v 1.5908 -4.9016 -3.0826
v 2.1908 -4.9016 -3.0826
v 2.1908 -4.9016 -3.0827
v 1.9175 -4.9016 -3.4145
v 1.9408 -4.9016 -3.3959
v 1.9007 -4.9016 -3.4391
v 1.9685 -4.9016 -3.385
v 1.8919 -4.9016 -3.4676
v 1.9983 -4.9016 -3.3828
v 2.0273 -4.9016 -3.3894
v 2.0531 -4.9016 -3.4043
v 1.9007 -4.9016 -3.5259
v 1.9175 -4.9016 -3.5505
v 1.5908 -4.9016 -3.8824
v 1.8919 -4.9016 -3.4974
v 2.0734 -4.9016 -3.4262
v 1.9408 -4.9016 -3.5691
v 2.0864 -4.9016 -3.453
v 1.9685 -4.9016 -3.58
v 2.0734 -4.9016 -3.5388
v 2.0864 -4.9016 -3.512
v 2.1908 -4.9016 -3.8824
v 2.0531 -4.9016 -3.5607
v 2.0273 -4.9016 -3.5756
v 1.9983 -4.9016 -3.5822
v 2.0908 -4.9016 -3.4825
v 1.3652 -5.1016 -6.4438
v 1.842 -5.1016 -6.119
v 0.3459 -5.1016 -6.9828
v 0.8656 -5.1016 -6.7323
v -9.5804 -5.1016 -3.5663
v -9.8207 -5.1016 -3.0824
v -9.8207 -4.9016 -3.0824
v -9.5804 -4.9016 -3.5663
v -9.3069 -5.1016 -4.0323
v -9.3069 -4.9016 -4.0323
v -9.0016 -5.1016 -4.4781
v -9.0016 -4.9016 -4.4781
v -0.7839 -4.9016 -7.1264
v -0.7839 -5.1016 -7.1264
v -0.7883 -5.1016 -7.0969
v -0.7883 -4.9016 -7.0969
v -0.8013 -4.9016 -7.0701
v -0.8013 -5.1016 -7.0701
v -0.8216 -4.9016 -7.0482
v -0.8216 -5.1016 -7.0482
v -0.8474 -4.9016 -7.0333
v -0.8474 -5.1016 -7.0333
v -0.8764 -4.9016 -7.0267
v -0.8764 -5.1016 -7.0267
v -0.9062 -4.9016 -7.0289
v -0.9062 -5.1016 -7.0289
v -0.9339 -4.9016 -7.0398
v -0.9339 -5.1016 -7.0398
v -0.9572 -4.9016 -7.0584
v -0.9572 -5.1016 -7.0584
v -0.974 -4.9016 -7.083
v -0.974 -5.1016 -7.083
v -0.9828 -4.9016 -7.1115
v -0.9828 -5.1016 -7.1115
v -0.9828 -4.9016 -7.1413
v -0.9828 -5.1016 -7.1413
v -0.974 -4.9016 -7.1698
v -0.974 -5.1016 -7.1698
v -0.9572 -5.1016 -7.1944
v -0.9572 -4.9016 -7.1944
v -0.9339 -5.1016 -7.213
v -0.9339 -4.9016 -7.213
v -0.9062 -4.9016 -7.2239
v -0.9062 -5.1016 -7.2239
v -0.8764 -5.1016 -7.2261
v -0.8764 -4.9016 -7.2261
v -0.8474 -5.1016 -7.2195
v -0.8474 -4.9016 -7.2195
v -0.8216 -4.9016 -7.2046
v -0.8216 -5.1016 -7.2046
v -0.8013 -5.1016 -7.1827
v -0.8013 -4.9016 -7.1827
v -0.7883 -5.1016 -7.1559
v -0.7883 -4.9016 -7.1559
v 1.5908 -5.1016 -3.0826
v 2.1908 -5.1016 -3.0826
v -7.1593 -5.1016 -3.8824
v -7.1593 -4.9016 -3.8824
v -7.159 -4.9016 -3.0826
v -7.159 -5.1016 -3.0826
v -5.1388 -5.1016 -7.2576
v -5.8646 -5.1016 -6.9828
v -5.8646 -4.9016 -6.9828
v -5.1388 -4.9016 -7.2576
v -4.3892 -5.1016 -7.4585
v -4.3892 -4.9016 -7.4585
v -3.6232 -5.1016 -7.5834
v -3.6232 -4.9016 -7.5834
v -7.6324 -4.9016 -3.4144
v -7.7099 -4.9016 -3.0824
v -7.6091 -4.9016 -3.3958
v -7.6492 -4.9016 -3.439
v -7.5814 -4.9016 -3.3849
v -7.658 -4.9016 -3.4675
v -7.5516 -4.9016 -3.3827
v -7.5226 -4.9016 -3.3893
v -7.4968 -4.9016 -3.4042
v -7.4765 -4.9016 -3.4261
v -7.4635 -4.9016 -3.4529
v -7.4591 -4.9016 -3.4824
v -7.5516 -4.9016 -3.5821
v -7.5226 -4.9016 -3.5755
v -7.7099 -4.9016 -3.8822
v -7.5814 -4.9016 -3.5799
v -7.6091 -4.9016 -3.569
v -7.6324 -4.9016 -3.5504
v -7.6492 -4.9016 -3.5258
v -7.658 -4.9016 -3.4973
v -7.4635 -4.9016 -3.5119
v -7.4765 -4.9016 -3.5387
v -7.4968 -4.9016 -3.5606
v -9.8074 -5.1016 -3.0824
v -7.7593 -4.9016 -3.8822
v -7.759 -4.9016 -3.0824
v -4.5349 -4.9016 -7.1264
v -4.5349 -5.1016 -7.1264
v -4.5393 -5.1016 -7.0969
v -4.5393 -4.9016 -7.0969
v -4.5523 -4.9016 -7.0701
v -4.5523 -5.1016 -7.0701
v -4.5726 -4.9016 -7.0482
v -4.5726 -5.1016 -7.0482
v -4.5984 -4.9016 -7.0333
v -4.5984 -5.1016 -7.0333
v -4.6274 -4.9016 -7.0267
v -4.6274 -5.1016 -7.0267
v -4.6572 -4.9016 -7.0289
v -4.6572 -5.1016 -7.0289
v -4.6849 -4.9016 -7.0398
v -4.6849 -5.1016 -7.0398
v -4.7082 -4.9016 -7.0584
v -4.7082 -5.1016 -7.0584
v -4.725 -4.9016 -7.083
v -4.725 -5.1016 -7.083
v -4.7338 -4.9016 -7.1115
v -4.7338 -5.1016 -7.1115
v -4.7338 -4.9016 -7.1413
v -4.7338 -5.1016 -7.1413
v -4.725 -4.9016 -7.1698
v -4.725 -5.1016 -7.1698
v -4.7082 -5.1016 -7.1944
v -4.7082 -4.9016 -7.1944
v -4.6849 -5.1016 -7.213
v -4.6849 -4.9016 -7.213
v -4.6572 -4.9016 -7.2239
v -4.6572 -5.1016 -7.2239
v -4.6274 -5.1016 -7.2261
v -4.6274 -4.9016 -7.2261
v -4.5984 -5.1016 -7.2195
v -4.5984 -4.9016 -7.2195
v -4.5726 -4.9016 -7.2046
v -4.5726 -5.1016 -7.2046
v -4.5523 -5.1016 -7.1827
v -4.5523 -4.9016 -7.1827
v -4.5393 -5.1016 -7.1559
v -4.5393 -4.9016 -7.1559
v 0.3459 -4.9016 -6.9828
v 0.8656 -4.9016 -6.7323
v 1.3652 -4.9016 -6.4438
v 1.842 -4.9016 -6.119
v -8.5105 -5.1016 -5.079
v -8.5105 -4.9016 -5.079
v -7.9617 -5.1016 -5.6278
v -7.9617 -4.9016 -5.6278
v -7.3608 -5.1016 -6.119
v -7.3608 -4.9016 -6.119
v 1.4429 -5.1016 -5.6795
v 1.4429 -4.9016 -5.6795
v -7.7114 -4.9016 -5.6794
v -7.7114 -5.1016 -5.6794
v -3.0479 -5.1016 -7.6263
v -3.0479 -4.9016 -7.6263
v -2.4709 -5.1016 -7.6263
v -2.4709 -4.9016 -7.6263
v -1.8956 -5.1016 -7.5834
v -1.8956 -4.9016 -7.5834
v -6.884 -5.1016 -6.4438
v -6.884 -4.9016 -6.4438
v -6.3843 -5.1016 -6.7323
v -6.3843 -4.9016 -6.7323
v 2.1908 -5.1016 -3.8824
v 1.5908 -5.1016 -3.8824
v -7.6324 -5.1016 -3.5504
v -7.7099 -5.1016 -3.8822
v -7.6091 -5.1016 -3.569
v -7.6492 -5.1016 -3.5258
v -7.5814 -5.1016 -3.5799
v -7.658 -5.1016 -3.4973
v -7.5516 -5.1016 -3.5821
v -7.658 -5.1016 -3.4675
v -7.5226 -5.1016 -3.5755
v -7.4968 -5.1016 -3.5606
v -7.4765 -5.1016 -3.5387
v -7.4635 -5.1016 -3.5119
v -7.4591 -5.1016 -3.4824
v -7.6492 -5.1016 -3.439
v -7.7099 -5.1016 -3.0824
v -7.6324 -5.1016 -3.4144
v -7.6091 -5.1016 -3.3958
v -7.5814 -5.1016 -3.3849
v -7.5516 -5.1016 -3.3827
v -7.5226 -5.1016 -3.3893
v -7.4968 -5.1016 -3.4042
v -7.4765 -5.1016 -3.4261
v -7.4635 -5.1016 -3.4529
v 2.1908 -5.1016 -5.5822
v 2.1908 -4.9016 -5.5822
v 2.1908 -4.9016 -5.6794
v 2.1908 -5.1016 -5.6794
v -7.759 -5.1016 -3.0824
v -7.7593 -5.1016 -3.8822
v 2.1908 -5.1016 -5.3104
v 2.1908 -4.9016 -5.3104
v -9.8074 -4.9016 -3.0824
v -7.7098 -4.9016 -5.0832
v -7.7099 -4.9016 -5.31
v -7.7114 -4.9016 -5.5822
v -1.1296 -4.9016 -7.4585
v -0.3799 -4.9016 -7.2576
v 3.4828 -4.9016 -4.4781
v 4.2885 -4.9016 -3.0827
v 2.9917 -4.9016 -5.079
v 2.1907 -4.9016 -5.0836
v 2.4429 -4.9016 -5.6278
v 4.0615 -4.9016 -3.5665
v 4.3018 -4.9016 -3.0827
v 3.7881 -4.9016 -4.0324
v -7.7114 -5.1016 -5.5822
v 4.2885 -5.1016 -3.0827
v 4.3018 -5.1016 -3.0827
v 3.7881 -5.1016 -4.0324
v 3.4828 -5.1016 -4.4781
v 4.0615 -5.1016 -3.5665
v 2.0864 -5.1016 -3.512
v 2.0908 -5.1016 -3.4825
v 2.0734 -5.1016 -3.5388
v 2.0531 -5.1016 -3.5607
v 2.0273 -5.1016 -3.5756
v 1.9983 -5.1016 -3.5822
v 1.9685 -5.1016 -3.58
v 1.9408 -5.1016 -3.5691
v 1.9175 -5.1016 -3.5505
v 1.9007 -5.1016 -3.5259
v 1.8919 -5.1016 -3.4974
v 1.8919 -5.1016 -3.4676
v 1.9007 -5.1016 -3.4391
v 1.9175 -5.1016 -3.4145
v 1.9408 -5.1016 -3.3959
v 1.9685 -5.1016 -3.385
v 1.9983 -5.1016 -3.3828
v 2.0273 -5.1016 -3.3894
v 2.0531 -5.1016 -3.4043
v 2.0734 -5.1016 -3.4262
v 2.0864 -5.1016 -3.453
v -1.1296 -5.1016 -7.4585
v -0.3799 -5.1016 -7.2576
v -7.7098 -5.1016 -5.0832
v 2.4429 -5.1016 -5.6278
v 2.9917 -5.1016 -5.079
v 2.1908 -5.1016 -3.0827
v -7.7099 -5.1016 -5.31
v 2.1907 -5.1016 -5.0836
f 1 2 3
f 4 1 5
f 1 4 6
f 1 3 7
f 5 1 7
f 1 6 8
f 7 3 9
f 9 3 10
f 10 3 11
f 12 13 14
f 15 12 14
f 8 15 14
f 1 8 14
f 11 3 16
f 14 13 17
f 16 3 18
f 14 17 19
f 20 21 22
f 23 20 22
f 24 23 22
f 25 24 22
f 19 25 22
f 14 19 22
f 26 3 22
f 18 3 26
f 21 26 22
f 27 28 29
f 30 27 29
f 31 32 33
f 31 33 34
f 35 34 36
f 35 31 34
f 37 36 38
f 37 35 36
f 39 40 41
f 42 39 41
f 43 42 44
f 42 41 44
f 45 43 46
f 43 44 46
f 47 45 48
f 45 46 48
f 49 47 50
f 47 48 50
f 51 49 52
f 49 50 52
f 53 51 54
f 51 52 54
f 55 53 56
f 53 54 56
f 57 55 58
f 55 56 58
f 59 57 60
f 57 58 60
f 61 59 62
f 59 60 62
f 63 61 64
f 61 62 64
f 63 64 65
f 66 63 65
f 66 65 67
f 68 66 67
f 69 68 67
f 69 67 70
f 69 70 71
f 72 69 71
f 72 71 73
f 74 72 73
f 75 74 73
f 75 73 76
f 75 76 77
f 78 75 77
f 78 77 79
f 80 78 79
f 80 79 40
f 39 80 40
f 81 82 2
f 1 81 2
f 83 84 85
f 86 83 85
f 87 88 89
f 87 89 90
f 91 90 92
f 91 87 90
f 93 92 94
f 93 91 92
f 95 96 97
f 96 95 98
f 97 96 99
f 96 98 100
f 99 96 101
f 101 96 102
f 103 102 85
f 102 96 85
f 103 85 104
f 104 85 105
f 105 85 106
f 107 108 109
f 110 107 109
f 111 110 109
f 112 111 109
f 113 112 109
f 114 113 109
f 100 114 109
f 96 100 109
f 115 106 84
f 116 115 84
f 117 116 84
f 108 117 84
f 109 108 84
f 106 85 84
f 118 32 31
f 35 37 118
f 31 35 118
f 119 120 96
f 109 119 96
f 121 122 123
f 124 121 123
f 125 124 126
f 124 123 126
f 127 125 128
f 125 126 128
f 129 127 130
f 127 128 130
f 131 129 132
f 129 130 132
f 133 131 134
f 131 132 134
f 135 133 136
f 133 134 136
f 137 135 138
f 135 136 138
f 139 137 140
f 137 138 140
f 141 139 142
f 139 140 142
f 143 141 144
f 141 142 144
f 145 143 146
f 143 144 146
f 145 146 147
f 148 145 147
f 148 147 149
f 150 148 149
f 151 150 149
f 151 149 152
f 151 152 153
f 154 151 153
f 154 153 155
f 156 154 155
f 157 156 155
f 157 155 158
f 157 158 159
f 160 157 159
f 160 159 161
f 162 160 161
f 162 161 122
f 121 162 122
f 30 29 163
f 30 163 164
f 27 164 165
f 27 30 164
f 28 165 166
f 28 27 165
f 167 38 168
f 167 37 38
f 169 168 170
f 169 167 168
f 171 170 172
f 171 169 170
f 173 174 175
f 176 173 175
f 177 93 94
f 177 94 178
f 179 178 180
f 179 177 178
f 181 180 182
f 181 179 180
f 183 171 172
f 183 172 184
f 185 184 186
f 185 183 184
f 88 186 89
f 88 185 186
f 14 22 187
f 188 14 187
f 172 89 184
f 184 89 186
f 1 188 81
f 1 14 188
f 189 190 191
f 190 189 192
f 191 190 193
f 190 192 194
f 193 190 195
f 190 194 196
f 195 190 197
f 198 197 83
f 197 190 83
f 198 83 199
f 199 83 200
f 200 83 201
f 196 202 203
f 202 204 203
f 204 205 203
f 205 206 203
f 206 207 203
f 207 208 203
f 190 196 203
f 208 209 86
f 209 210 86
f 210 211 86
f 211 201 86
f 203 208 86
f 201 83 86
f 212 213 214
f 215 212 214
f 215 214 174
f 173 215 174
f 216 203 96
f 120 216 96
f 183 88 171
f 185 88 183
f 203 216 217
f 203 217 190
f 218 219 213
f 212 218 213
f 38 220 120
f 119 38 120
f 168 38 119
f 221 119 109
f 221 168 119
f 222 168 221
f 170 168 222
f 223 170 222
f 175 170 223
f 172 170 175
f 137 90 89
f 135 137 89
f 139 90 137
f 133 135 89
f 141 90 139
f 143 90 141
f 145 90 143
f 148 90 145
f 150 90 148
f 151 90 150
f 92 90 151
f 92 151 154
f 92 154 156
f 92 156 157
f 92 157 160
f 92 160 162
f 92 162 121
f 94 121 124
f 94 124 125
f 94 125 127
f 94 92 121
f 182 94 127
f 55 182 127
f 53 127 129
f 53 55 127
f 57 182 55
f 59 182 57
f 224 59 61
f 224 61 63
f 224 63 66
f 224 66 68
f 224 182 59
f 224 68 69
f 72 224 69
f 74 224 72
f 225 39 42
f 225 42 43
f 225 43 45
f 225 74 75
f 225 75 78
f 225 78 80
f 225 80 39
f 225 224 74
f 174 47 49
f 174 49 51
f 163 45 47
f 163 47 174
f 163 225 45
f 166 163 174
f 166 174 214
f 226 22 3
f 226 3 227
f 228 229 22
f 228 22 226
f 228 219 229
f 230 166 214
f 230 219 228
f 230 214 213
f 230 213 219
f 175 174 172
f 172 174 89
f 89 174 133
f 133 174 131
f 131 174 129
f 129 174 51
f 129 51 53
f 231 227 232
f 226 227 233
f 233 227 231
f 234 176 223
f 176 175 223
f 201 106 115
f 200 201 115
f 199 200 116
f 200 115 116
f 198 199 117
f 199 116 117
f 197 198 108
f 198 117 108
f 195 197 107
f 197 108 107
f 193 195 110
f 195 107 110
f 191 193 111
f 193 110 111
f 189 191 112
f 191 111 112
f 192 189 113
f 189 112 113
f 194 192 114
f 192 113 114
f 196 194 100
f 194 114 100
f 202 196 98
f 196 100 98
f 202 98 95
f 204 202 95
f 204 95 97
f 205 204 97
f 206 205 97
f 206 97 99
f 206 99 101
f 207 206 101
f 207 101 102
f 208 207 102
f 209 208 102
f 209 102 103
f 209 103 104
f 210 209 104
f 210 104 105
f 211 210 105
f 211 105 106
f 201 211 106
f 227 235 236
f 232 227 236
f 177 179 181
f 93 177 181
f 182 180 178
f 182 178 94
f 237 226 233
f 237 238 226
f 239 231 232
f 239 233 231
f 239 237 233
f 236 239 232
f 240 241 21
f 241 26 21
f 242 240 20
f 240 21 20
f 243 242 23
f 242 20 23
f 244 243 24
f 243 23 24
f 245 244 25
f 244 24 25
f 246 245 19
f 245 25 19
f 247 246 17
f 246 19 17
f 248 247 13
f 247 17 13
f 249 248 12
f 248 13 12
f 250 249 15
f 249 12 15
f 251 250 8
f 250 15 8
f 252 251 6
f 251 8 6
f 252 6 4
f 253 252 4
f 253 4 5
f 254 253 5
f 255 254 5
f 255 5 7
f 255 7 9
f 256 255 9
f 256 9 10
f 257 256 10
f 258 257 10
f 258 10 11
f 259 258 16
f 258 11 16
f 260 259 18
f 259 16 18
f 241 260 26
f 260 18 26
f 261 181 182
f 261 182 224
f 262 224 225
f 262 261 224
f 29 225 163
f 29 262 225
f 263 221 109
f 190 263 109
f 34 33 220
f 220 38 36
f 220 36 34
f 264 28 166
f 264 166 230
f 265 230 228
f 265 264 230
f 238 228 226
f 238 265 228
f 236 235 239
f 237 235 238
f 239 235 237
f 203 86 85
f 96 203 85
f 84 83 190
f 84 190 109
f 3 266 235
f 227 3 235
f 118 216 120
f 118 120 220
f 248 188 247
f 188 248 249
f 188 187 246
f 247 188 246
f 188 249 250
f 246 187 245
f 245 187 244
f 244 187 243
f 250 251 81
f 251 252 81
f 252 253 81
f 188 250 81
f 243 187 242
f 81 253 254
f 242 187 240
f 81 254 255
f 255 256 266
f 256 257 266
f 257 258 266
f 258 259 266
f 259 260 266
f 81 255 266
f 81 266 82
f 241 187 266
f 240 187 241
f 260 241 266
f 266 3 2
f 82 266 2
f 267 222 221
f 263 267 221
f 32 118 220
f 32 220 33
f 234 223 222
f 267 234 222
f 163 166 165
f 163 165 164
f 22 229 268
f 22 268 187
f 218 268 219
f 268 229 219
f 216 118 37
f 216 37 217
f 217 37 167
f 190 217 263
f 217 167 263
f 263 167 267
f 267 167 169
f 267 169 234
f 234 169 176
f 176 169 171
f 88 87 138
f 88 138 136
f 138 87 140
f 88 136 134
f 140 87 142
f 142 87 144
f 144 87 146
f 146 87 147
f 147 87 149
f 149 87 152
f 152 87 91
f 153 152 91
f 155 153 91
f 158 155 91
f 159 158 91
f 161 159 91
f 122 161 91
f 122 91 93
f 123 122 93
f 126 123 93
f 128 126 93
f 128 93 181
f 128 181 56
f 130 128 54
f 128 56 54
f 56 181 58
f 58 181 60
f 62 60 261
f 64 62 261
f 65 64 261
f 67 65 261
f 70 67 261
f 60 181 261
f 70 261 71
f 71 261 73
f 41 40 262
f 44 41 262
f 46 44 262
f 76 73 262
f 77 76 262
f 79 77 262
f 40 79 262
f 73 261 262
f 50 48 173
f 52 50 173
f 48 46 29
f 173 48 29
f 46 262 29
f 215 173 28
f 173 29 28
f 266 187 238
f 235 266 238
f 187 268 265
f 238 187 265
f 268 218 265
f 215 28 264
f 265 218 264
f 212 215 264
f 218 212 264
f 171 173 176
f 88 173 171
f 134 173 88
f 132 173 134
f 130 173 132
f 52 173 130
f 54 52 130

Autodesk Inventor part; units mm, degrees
ref_plane "Plano de trabajo1" through (-3.6477, -5.1016, -7.3334) normal (0, 1, 0) x (1, 0, 0)
sketch "Boceto1" plane through (-3.6477, -5.1016, -7.3334) normal (0, 1, 0) x (1, 0, 0)
  line L0 (5.2883, -3.4507) -> (5.2882, -3.8566) projected
  line L1 (4.7883, -3.4507) -> (5.2883, -3.4507) projected
  line L2 (5.2882, -3.8566) -> (5.2882, -4.1566) projected
  line L3 (5.2881, -4.2507) -> (4.0881, -4.2506) projected
  line L4 (-3.5114, -3.8566) -> (-3.5113, -4.1566) projected
  line L5 (-3.5114, -3.8566) -> (-3.5116, -3.451) projected
  line L6 (-3.5116, -3.451) -> (-3.0116, -3.4508) projected
  line L7 (-3.7131, -1.2144) -> (-2.2169, -0.3506) projected
  line L8 (-6.2177, -4.3514) -> (-5.3539, -2.8553) projected
  line L9 (7.1305, -2.8553) -> (7.9943, -4.3514) projected
  line L10 (3.9936, -0.3506) -> (5.4897, -1.2144) projected
  line L11 (0.0245, 0.25) -> (1.7521, 0.25) projected
  arc A0 (7.9495, -4.2507) -> (-6.173, -4.251) centre (0.8883, -7.4566) ccw
  line L12 (-2.3112, -4.2505) -> (-3.5112, -4.251) projected
  line L13 (5.2881, -4.2507) -> (7.9495, -4.2507)
  line L14 (-3.5112, -4.251) -> (-6.173, -4.251)
  line L15 (-3.5112, -4.251) -> (-3.5116, -3.451)
  line L16 (-3.5116, -3.451) -> (5.2883, -3.4507)
  line L17 (5.2883, -3.4507) -> (5.2881, -4.2507)
  point P0 (3.6477, -7.3334)
extrude "Extrusión1" add sketch "Boceto1" along normal blind 0.2
ref_plane "Plano de trabajo2" through (-3.6477, -4.9016, -7.3334) normal (0, 1, 0) x (1, 0, 0)
sketch "Boceto2" plane through (-3.6477, -4.9016, -7.3334) normal (0, 1, 0) x (1, 0, 0)
  line L0 (5.0906, -1.7512) -> (-3.3106, -1.7469) projected
  line L1 (-3.3106, -1.8516) -> (-3.9207, -1.8515) projected
  line L2 (5.8384, -2.2498) -> (5.8385, -2.023) projected
  line L3 (-4.0622, -2.0234) -> (-4.0621, -2.2502) projected
  line L4 (5.8385, -2.023) -> (5.8385, -4.7089)
  line L5 (-4.0622, -2.0234) -> (-4.0622, -5.784)
  line L6 (5.0906, -1.7512) -> (-3.3106, -1.7469)
  line L7 (5.8385, -2.023) -> (5.8385, -1.7512)
  line L8 (5.8385, -1.7512) -> (5.0906, -1.7512)
  line L9 (-3.3106, -1.7469) -> (-4.0637, -1.7512)
  line L10 (-4.0637, -1.7512) -> (-4.0622, -2.0234)
  line L11 (5.8385, -4.7089) -> (-4.0637, -4.7089)
  line L12 (-4.0637, -4.7089) -> (-4.0637, -1.7512)
  line L13 (-4.0637, -1.7512) -> (5.8385, -1.7512)
  line L14 (5.8385, -1.7512) -> (5.8385, -4.7089)
  line L15 (5.0906, -1.6539) -> (-3.3105, -1.6519) projected
  line L16 (-4.0637, -1.7512) -> (5.8385, -1.7512)
  line L17 (5.8385, -1.7512) -> (5.8385, -1.654)
  line L18 (5.8385, -1.654) -> (-4.0637, -1.654)
  line L19 (-4.0637, -1.654) -> (-4.0637, -1.7512)
  point P0 (3.6477, -7.3334)
  point P1 (-3.2616, -3.4509)
extrude "Extrusión2" cut sketch "Boceto2" against normal blind 0.2
ref_plane "Plano de trabajo3" through (-7.1593, -4.0366, -3.8824) normal (-1, 0, 0.0004) x (0.0004, 0, 1)
sketch "Boceto3" plane through (-7.1593, -4.0366, -3.8824) normal (-1, 0, 0.0004) x (0.0004, 0, 1)
  line L0 (0.7998, -1.065) -> (0.7998, -0.865) projected
  line L1 (-1.7972, -1.065) -> (0.7998, -1.065) projected
  line L2 (-1.7972, -0.865) -> (-1.7972, -1.065) projected
  line L3 (0.7998, -0.865) -> (-1.7972, -0.865) projected
  line L4 (0, -1.065) -> (0, -0.4397)
  line L5 (0.7998, -0.865) -> (0, -0.865)
  line L6 (0, -0.865) -> (0, -1.065)
  line L7 (0, -1.065) -> (0.7998, -1.065)
  line L8 (0.7998, -1.065) -> (0.7998, -0.865)
  point P0 (3.8854, 4.0366)
extrude "Extrusión3" add sketch "Boceto3" along normal blind 0.6 contours L1 L4 L3 L0
ref_plane "Plano de trabajo4" through (2.1908, -4.9016, -5.3103) normal (-1, 0, 0) x (0, 0, 1)
sketch "Boceto4" plane through (2.1908, -4.9016, -5.3103) normal (-1, 0, 0) x (0, 0, 1)
  line L0 (2.2277, -0.2) -> (2.2277, 0) projected
  line L1 (1.4279, 0) -> (1.4279, -0.2) projected
  line L2 (2.2277, 0) -> (1.4279, 0) projected
  line L3 (1.4279, -0.2) -> (2.2277, -0.2) projected
  point P0 (5.3103, 4.9016)
extrude "Extrusión4" add sketch "Boceto4" along normal blind 0.6
sketch "Boceto5" plane through (-3.6477, -4.9016, -7.3334) normal (0, 1, 0) x (1, 0, 0)
  line L0 (-3.5116, -3.451) -> (-3.5112, -4.2507) projected
  line L1 (-3.5112, -4.2507) -> (-4.3112, -4.251)
  line L2 (-4.1112, -4.251) -> (-6.173, -4.251) projected
  line L3 (-3.5116, -3.451) -> (-3.5112, -4.2507)
  circle A0 centre (-3.9114, -3.851) radius 0.1
  line L4 (5.2385, -3.451) -> (5.2385, -4.2507) projected
  line L5 (5.2385, -3.451) -> (5.2385, -4.2507)
  line L6 (5.2385, -4.2507) -> (6.0385, -4.2507)
  line L7 (5.8385, -4.2507) -> (7.9495, -4.2507) projected
  line L8 (5.8385, -3.451) -> (5.2385, -3.451) projected
  circle A1 centre (5.6385, -3.8509) radius 0.1
  point P0 (3.6477, -7.3334)
  dimension "d9" = 0.8
  dimension "d10" = 0.2
  dimension "d11" = 0.8
  dimension "d12" = 0.2
extrude "Extrusión5" cut sketch "Boceto5" against normal blind 0.6
sketch "Boceto6" plane through (-3.6477, -5.1016, -7.3334) normal (0, -1, 0) x (1, 0, 0)
  circle A0 centre (-0.9872, 0.207) radius 0.1 projected
  circle A1 centre (2.7638, 0.207) radius 0.1 projected
  point P0 (3.6477, 7.3334)
extrude "Extrusión6" cut sketch "Boceto6" against normal blind 1
properties part number "va"
